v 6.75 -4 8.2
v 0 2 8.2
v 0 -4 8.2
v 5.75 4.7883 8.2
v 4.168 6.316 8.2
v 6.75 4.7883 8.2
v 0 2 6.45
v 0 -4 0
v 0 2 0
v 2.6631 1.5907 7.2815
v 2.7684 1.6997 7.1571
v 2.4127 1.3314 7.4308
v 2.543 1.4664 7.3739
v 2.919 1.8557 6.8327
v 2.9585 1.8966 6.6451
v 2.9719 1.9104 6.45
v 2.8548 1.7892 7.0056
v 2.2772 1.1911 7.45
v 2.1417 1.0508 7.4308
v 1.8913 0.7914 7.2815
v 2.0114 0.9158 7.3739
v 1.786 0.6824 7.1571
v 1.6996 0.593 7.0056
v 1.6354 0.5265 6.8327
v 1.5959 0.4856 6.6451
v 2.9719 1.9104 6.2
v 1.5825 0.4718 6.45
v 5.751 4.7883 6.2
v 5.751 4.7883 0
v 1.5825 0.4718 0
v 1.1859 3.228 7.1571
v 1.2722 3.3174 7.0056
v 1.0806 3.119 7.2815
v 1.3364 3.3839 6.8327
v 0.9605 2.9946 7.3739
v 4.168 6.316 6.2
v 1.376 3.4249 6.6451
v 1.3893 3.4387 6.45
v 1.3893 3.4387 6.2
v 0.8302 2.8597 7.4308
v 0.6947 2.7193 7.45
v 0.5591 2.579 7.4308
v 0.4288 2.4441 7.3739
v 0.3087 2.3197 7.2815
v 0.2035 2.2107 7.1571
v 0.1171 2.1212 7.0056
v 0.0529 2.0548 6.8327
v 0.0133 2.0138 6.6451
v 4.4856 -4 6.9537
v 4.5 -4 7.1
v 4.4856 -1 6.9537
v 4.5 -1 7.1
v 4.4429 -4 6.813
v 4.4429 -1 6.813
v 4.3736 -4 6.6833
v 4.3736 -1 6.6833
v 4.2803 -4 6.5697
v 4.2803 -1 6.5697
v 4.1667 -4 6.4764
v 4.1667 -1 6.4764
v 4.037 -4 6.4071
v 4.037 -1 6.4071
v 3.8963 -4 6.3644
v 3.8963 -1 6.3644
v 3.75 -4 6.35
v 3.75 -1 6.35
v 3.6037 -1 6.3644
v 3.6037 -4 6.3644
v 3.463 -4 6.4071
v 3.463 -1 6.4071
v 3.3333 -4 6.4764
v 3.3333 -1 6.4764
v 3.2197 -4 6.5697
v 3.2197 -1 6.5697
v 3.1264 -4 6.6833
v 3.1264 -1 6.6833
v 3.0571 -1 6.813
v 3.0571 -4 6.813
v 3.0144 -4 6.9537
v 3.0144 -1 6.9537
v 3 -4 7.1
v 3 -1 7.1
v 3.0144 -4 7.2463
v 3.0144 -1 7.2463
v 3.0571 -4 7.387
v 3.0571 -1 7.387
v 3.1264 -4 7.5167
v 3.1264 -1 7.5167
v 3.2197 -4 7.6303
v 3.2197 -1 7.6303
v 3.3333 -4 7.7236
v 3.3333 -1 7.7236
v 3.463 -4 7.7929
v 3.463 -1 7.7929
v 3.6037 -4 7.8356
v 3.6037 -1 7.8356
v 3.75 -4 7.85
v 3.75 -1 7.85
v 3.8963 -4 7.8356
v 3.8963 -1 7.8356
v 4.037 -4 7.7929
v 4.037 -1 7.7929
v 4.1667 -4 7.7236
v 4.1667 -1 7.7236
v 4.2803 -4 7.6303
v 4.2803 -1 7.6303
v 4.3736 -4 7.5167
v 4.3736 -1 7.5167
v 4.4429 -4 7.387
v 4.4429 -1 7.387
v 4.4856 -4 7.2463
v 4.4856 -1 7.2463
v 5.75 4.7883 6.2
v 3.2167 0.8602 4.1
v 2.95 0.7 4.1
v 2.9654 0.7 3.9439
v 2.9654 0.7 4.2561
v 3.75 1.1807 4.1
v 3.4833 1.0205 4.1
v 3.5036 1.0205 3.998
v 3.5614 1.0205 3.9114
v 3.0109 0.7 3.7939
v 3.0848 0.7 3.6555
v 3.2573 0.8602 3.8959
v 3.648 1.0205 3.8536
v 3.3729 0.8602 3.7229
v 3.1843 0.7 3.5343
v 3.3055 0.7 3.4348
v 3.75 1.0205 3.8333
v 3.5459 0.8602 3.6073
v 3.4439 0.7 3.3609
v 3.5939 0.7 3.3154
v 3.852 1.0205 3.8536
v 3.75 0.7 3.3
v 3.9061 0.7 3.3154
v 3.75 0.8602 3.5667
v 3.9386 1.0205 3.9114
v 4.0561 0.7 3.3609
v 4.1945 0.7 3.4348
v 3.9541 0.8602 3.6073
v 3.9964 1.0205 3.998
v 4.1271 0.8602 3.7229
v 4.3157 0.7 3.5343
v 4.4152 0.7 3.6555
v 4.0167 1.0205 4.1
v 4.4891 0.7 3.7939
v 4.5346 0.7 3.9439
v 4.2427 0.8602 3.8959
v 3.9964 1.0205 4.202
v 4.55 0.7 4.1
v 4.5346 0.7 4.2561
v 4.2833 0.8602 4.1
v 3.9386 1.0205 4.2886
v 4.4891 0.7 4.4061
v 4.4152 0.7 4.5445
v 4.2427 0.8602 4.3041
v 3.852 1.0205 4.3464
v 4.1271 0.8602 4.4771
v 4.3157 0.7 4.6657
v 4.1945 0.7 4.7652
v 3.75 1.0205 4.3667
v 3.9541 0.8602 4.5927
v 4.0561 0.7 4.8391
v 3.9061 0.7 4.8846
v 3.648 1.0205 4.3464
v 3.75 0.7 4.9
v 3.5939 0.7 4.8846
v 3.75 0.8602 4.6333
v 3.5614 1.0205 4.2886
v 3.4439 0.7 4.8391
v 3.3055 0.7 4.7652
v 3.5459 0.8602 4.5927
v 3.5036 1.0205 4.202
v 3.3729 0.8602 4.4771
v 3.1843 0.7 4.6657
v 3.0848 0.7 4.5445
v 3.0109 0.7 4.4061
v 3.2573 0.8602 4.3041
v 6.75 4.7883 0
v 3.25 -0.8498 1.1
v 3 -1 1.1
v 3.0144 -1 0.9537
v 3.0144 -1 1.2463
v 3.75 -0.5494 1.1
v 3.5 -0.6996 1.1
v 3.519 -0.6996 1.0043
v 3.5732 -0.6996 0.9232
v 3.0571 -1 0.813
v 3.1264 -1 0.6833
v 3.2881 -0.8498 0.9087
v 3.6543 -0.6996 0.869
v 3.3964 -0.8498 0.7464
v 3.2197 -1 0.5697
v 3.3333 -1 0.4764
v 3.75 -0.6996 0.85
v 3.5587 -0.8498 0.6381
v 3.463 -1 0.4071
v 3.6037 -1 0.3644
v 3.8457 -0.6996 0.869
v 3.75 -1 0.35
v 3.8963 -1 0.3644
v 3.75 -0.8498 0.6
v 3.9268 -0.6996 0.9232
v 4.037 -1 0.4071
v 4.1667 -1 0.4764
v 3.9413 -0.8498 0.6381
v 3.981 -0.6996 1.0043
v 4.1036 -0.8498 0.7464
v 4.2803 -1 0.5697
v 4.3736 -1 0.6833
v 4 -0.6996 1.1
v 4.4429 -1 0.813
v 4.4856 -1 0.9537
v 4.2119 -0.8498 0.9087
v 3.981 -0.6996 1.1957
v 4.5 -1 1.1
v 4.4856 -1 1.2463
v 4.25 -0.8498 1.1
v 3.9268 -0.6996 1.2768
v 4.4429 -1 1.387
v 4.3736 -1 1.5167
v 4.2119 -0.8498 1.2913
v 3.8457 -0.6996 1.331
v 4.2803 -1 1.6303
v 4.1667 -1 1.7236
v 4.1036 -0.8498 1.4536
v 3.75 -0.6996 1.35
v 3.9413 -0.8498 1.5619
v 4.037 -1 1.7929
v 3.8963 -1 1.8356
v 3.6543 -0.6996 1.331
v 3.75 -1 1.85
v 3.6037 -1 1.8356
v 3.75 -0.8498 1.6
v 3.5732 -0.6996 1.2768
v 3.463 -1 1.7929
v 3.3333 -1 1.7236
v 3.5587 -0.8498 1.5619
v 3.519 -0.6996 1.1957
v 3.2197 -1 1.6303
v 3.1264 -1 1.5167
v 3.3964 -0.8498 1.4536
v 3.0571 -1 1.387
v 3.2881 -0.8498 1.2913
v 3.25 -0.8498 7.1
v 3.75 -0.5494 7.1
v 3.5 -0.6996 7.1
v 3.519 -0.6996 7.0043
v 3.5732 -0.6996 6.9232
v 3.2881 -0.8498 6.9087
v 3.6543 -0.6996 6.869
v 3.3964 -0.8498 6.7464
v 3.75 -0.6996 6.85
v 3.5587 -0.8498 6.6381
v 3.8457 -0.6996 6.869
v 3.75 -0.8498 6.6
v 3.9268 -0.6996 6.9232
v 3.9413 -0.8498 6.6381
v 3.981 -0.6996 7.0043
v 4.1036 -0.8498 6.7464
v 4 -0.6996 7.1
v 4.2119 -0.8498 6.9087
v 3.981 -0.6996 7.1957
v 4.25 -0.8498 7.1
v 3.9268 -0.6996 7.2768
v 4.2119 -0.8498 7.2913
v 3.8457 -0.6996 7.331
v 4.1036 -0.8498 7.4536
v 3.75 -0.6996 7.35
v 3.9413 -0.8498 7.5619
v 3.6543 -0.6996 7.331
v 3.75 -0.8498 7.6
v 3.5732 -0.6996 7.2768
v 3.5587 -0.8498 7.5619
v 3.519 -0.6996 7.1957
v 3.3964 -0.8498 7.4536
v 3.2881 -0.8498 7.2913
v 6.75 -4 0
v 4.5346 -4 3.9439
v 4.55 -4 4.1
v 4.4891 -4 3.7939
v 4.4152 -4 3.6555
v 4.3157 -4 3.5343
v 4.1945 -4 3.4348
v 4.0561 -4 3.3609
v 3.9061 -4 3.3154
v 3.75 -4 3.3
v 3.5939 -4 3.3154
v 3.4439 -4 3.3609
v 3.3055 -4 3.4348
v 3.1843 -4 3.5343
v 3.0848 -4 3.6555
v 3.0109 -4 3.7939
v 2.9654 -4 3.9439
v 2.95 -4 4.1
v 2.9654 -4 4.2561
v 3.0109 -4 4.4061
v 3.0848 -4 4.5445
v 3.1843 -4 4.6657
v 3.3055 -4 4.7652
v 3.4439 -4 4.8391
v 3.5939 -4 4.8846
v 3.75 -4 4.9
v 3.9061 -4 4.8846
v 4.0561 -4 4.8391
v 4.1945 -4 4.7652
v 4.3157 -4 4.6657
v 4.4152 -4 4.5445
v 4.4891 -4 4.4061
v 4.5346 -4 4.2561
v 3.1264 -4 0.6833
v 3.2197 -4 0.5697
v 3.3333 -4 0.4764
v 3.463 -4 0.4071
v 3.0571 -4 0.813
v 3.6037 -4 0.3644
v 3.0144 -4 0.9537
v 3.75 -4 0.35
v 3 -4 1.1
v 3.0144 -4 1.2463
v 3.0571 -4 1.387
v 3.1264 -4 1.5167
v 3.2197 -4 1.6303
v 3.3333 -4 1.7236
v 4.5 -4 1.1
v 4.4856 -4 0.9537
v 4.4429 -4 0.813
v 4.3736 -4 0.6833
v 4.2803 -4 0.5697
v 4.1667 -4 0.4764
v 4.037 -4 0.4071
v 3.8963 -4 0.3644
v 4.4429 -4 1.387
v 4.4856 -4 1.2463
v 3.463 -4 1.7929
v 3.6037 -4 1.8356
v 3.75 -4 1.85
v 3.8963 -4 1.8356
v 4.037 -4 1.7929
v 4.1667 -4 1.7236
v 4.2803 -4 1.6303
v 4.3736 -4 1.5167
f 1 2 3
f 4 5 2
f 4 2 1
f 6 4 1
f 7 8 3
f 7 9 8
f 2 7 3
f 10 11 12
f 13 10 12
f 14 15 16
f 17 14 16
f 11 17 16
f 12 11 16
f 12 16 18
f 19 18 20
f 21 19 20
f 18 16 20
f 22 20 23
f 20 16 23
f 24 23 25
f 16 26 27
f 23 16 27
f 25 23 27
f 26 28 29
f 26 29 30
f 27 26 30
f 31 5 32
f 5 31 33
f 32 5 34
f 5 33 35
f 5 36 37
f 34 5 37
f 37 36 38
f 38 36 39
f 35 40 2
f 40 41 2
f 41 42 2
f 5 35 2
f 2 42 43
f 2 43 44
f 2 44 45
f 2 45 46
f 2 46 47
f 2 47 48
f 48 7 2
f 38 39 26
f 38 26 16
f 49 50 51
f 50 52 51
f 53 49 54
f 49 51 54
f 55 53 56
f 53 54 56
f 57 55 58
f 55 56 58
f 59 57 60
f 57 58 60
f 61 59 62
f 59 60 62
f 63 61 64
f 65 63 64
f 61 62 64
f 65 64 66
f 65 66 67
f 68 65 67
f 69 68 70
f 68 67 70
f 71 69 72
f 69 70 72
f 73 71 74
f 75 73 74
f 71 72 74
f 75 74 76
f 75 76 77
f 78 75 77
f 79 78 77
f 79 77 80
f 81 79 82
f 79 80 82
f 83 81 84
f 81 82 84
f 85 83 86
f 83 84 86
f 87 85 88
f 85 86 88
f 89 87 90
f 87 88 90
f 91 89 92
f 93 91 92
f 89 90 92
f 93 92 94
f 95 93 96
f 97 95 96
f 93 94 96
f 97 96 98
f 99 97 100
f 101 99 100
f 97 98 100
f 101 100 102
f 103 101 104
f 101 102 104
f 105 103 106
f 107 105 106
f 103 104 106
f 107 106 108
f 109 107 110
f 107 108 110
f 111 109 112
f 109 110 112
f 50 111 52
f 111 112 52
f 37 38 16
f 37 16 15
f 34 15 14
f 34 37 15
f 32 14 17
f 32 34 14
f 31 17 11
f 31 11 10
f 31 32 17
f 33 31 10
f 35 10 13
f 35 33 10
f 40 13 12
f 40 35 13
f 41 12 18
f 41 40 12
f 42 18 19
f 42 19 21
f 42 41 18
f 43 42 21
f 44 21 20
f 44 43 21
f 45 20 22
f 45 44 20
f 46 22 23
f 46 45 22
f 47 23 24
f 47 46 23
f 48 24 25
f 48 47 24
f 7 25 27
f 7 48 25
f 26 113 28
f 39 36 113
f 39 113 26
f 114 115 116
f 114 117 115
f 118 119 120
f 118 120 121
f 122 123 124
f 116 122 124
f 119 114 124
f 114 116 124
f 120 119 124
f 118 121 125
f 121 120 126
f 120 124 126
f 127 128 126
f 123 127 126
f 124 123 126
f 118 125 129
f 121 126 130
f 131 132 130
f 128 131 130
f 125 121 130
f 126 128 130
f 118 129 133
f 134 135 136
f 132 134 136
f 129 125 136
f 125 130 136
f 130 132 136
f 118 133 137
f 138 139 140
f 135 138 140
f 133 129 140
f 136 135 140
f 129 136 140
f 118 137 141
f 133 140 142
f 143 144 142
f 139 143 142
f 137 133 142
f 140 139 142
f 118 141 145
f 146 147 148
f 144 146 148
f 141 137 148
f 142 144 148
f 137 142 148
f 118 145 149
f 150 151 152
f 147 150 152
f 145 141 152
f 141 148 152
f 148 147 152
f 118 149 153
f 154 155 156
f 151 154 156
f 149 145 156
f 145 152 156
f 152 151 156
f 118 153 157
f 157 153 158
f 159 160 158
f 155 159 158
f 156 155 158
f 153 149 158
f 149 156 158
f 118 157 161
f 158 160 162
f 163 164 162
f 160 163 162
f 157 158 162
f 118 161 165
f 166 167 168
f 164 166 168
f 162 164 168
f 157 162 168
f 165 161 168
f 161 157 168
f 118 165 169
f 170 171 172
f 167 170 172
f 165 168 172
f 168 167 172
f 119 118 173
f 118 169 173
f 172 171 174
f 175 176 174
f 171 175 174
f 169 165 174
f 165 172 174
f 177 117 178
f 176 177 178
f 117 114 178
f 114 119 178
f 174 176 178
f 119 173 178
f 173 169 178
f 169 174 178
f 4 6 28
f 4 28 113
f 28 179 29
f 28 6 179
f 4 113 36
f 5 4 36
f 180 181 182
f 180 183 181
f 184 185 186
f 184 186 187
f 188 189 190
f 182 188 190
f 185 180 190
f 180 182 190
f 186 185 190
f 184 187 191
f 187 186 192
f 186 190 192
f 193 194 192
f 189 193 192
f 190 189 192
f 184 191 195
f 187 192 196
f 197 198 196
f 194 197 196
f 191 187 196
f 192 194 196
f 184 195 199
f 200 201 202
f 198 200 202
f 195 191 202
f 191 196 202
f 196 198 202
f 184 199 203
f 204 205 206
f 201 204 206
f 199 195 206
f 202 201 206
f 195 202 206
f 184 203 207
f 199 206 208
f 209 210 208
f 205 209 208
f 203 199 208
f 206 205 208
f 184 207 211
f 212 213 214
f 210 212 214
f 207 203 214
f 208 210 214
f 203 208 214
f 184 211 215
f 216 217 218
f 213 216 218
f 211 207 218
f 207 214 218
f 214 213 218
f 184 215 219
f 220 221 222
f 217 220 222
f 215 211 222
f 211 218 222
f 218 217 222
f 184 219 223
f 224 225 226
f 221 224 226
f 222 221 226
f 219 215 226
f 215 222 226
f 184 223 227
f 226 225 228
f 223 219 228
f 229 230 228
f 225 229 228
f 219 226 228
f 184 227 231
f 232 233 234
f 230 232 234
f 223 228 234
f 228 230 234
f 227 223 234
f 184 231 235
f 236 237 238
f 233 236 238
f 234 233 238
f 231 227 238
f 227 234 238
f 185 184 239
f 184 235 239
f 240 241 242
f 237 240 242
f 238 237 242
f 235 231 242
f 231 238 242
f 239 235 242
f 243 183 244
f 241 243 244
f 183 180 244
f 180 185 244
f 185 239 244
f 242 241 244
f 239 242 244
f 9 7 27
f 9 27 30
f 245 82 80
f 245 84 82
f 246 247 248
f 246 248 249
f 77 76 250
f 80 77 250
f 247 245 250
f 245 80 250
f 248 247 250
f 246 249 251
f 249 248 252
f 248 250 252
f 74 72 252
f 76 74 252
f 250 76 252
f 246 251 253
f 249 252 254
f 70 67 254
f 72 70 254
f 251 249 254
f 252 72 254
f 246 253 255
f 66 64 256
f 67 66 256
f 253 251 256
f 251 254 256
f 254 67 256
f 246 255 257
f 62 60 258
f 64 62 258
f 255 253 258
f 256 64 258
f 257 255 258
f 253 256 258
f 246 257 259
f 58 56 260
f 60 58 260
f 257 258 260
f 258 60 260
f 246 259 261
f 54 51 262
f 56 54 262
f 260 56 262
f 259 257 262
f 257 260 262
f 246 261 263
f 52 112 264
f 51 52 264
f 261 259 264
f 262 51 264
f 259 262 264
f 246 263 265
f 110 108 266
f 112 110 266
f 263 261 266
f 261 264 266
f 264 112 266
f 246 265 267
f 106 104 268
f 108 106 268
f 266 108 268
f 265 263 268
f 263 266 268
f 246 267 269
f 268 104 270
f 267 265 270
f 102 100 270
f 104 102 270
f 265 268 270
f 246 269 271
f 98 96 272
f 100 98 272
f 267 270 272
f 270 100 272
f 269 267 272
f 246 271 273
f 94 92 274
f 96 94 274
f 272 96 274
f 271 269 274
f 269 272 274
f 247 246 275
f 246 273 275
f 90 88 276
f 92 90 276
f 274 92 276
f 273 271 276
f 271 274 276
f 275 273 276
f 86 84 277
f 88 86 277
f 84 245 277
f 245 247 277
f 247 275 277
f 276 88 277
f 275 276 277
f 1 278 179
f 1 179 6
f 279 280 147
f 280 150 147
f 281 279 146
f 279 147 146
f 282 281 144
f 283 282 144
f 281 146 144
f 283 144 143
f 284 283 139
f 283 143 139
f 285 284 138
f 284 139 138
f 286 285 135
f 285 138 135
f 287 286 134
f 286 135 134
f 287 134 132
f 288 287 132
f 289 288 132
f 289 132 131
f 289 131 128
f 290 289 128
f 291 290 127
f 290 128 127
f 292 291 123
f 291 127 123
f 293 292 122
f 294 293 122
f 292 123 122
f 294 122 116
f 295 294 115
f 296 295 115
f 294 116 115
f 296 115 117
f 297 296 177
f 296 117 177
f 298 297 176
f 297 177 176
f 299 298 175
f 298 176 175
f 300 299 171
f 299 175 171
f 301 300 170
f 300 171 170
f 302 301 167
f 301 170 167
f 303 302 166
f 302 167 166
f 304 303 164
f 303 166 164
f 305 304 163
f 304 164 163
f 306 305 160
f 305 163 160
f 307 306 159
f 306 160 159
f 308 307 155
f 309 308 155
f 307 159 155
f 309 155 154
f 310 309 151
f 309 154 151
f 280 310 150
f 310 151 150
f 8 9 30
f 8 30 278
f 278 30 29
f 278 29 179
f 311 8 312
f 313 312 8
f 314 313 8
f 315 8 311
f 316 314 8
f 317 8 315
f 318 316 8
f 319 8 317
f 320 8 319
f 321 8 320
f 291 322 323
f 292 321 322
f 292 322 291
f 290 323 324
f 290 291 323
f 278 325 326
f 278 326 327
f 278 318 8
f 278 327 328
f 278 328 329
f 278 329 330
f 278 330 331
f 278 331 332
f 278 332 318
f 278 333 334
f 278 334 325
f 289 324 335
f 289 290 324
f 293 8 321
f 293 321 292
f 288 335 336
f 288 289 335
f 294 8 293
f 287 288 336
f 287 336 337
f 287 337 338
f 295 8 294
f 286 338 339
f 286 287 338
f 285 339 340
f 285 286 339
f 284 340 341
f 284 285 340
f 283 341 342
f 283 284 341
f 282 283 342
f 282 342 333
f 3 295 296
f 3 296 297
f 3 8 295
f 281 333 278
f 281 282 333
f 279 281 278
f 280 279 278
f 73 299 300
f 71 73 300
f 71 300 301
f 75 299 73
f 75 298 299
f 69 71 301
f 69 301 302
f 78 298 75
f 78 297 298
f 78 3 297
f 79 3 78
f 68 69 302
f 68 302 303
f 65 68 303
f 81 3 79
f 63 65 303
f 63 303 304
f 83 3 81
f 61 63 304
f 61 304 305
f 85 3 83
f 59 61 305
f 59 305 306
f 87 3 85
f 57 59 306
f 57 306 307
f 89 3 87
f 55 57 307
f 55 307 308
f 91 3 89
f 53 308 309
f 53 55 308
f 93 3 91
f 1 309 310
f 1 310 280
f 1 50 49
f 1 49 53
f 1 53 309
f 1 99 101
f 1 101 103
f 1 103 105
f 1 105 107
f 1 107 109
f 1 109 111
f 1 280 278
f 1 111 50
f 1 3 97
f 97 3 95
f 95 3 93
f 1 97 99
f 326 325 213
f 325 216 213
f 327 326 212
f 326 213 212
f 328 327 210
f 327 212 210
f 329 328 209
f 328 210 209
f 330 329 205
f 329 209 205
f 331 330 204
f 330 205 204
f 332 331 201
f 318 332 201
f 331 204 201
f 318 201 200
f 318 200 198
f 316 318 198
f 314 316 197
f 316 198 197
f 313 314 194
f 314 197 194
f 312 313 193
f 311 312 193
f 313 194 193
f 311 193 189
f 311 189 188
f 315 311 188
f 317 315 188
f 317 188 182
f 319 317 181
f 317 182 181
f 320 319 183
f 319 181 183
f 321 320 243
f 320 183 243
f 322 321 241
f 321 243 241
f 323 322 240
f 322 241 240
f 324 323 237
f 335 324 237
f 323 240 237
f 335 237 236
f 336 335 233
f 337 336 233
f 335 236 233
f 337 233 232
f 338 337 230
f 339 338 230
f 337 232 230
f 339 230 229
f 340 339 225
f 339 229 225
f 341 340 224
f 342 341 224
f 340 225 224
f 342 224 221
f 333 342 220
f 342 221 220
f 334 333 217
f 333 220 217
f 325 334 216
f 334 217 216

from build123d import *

# Parameters (mm, degrees)
BOSS_EXTRUDE1_DEPTH       = 8.2
CUT_EXTRUDE1_DEPTH        = 2.2
SKETCH3_W                 = 6.75
SKETCH3_H                 = 8.2
BOSS_EXTRUDE2_DEPTH       = 4
M2X0_4_TAPPED_HOLE1_D     = 1.6
M2X0_4_TAPPED_HOLE1_DEPTH = 4.7
M2X0_4_TAPPED_HOLE1_TIP   = 0.480688495
F_1_5MM_DOWEL_HOLE1_D     = 1.5
F_1_5MM_DOWEL_HOLE1_DEPTH = 3
F_1_5MM_DOWEL_HOLE1_TIP   = 0.450645464


with BuildPart() as part:
    # Sketch1 → Boss-Extrude1 (new body)
    with BuildSketch(Plane.XY):
        Polygon((0, 0), (6.75, 0), (6.75, 4.788271091), (5.75, 4.788271091), (4.167950223, 6.316038802), (0, 2), align=None)
    extrude(amount=BOSS_EXTRUDE1_DEPTH)

    # Sketch2 → Cut-Extrude1 (cut)
    with BuildSketch(Plane(origin=(-0.999390827, 0.965100503, 0), x_dir=(0.69465837, 0.7193398, 0), z_dir=(-0.7193398, 0.69465837, 0))):
        with BuildLine():
            Line((8.438679601, 0), (8.438679601, -6.2))
            Line((8.438679601, -6.2), (3.438679601, -6.2))
            Line((3.438679601, -6.2), (3.438679601, -6.45))
            ThreePointArc((3.438679601, -6.45), (2.438679601, -7.45), (1.438679601, -6.45))
            Line((1.438679601, -6.45), (1.438679601, 0))
            Line((1.438679601, 0), (8.438679601, 0))
        make_face()
    extrude(amount=-CUT_EXTRUDE1_DEPTH, mode=Mode.SUBTRACT)

    # Sketch3 → Boss-Extrude2 (add)
    with BuildSketch(Plane.XZ):
        with Locations((3.375, 4.1)):
            Rectangle(SKETCH3_W, SKETCH3_H)
    extrude(amount=BOSS_EXTRUDE2_DEPTH)

    # M2x0.4 Tapped Hole1
    with Locations(Plane(origin=(0, -4, 0), x_dir=(-1, 0, 0), z_dir=(0, -1, 0))):
        with Locations((-3.75, -4.1)):
            Hole(M2X0_4_TAPPED_HOLE1_D / 2, depth=M2X0_4_TAPPED_HOLE1_DEPTH)
            with Locations((0, 0, -(M2X0_4_TAPPED_HOLE1_DEPTH + M2X0_4_TAPPED_HOLE1_TIP / 2))):  # 118° drill point
                Cone(0, M2X0_4_TAPPED_HOLE1_D / 2, M2X0_4_TAPPED_HOLE1_TIP, mode=Mode.SUBTRACT)

    # Ø1.5mm Dowel Hole1
    with Locations(Plane(origin=(0, -4, 0), x_dir=(-1, 0, 0), z_dir=(0, -1, 0))):
        with Locations((-3.75, -7.1), (-3.75, -1.1)):
            Hole(F_1_5MM_DOWEL_HOLE1_D / 2, depth=F_1_5MM_DOWEL_HOLE1_DEPTH)
            with Locations((0, 0, -(F_1_5MM_DOWEL_HOLE1_DEPTH + F_1_5MM_DOWEL_HOLE1_TIP / 2))):  # 118° drill point
                Cone(0, F_1_5MM_DOWEL_HOLE1_D / 2, F_1_5MM_DOWEL_HOLE1_TIP, mode=Mode.SUBTRACT)


solid = part.part
